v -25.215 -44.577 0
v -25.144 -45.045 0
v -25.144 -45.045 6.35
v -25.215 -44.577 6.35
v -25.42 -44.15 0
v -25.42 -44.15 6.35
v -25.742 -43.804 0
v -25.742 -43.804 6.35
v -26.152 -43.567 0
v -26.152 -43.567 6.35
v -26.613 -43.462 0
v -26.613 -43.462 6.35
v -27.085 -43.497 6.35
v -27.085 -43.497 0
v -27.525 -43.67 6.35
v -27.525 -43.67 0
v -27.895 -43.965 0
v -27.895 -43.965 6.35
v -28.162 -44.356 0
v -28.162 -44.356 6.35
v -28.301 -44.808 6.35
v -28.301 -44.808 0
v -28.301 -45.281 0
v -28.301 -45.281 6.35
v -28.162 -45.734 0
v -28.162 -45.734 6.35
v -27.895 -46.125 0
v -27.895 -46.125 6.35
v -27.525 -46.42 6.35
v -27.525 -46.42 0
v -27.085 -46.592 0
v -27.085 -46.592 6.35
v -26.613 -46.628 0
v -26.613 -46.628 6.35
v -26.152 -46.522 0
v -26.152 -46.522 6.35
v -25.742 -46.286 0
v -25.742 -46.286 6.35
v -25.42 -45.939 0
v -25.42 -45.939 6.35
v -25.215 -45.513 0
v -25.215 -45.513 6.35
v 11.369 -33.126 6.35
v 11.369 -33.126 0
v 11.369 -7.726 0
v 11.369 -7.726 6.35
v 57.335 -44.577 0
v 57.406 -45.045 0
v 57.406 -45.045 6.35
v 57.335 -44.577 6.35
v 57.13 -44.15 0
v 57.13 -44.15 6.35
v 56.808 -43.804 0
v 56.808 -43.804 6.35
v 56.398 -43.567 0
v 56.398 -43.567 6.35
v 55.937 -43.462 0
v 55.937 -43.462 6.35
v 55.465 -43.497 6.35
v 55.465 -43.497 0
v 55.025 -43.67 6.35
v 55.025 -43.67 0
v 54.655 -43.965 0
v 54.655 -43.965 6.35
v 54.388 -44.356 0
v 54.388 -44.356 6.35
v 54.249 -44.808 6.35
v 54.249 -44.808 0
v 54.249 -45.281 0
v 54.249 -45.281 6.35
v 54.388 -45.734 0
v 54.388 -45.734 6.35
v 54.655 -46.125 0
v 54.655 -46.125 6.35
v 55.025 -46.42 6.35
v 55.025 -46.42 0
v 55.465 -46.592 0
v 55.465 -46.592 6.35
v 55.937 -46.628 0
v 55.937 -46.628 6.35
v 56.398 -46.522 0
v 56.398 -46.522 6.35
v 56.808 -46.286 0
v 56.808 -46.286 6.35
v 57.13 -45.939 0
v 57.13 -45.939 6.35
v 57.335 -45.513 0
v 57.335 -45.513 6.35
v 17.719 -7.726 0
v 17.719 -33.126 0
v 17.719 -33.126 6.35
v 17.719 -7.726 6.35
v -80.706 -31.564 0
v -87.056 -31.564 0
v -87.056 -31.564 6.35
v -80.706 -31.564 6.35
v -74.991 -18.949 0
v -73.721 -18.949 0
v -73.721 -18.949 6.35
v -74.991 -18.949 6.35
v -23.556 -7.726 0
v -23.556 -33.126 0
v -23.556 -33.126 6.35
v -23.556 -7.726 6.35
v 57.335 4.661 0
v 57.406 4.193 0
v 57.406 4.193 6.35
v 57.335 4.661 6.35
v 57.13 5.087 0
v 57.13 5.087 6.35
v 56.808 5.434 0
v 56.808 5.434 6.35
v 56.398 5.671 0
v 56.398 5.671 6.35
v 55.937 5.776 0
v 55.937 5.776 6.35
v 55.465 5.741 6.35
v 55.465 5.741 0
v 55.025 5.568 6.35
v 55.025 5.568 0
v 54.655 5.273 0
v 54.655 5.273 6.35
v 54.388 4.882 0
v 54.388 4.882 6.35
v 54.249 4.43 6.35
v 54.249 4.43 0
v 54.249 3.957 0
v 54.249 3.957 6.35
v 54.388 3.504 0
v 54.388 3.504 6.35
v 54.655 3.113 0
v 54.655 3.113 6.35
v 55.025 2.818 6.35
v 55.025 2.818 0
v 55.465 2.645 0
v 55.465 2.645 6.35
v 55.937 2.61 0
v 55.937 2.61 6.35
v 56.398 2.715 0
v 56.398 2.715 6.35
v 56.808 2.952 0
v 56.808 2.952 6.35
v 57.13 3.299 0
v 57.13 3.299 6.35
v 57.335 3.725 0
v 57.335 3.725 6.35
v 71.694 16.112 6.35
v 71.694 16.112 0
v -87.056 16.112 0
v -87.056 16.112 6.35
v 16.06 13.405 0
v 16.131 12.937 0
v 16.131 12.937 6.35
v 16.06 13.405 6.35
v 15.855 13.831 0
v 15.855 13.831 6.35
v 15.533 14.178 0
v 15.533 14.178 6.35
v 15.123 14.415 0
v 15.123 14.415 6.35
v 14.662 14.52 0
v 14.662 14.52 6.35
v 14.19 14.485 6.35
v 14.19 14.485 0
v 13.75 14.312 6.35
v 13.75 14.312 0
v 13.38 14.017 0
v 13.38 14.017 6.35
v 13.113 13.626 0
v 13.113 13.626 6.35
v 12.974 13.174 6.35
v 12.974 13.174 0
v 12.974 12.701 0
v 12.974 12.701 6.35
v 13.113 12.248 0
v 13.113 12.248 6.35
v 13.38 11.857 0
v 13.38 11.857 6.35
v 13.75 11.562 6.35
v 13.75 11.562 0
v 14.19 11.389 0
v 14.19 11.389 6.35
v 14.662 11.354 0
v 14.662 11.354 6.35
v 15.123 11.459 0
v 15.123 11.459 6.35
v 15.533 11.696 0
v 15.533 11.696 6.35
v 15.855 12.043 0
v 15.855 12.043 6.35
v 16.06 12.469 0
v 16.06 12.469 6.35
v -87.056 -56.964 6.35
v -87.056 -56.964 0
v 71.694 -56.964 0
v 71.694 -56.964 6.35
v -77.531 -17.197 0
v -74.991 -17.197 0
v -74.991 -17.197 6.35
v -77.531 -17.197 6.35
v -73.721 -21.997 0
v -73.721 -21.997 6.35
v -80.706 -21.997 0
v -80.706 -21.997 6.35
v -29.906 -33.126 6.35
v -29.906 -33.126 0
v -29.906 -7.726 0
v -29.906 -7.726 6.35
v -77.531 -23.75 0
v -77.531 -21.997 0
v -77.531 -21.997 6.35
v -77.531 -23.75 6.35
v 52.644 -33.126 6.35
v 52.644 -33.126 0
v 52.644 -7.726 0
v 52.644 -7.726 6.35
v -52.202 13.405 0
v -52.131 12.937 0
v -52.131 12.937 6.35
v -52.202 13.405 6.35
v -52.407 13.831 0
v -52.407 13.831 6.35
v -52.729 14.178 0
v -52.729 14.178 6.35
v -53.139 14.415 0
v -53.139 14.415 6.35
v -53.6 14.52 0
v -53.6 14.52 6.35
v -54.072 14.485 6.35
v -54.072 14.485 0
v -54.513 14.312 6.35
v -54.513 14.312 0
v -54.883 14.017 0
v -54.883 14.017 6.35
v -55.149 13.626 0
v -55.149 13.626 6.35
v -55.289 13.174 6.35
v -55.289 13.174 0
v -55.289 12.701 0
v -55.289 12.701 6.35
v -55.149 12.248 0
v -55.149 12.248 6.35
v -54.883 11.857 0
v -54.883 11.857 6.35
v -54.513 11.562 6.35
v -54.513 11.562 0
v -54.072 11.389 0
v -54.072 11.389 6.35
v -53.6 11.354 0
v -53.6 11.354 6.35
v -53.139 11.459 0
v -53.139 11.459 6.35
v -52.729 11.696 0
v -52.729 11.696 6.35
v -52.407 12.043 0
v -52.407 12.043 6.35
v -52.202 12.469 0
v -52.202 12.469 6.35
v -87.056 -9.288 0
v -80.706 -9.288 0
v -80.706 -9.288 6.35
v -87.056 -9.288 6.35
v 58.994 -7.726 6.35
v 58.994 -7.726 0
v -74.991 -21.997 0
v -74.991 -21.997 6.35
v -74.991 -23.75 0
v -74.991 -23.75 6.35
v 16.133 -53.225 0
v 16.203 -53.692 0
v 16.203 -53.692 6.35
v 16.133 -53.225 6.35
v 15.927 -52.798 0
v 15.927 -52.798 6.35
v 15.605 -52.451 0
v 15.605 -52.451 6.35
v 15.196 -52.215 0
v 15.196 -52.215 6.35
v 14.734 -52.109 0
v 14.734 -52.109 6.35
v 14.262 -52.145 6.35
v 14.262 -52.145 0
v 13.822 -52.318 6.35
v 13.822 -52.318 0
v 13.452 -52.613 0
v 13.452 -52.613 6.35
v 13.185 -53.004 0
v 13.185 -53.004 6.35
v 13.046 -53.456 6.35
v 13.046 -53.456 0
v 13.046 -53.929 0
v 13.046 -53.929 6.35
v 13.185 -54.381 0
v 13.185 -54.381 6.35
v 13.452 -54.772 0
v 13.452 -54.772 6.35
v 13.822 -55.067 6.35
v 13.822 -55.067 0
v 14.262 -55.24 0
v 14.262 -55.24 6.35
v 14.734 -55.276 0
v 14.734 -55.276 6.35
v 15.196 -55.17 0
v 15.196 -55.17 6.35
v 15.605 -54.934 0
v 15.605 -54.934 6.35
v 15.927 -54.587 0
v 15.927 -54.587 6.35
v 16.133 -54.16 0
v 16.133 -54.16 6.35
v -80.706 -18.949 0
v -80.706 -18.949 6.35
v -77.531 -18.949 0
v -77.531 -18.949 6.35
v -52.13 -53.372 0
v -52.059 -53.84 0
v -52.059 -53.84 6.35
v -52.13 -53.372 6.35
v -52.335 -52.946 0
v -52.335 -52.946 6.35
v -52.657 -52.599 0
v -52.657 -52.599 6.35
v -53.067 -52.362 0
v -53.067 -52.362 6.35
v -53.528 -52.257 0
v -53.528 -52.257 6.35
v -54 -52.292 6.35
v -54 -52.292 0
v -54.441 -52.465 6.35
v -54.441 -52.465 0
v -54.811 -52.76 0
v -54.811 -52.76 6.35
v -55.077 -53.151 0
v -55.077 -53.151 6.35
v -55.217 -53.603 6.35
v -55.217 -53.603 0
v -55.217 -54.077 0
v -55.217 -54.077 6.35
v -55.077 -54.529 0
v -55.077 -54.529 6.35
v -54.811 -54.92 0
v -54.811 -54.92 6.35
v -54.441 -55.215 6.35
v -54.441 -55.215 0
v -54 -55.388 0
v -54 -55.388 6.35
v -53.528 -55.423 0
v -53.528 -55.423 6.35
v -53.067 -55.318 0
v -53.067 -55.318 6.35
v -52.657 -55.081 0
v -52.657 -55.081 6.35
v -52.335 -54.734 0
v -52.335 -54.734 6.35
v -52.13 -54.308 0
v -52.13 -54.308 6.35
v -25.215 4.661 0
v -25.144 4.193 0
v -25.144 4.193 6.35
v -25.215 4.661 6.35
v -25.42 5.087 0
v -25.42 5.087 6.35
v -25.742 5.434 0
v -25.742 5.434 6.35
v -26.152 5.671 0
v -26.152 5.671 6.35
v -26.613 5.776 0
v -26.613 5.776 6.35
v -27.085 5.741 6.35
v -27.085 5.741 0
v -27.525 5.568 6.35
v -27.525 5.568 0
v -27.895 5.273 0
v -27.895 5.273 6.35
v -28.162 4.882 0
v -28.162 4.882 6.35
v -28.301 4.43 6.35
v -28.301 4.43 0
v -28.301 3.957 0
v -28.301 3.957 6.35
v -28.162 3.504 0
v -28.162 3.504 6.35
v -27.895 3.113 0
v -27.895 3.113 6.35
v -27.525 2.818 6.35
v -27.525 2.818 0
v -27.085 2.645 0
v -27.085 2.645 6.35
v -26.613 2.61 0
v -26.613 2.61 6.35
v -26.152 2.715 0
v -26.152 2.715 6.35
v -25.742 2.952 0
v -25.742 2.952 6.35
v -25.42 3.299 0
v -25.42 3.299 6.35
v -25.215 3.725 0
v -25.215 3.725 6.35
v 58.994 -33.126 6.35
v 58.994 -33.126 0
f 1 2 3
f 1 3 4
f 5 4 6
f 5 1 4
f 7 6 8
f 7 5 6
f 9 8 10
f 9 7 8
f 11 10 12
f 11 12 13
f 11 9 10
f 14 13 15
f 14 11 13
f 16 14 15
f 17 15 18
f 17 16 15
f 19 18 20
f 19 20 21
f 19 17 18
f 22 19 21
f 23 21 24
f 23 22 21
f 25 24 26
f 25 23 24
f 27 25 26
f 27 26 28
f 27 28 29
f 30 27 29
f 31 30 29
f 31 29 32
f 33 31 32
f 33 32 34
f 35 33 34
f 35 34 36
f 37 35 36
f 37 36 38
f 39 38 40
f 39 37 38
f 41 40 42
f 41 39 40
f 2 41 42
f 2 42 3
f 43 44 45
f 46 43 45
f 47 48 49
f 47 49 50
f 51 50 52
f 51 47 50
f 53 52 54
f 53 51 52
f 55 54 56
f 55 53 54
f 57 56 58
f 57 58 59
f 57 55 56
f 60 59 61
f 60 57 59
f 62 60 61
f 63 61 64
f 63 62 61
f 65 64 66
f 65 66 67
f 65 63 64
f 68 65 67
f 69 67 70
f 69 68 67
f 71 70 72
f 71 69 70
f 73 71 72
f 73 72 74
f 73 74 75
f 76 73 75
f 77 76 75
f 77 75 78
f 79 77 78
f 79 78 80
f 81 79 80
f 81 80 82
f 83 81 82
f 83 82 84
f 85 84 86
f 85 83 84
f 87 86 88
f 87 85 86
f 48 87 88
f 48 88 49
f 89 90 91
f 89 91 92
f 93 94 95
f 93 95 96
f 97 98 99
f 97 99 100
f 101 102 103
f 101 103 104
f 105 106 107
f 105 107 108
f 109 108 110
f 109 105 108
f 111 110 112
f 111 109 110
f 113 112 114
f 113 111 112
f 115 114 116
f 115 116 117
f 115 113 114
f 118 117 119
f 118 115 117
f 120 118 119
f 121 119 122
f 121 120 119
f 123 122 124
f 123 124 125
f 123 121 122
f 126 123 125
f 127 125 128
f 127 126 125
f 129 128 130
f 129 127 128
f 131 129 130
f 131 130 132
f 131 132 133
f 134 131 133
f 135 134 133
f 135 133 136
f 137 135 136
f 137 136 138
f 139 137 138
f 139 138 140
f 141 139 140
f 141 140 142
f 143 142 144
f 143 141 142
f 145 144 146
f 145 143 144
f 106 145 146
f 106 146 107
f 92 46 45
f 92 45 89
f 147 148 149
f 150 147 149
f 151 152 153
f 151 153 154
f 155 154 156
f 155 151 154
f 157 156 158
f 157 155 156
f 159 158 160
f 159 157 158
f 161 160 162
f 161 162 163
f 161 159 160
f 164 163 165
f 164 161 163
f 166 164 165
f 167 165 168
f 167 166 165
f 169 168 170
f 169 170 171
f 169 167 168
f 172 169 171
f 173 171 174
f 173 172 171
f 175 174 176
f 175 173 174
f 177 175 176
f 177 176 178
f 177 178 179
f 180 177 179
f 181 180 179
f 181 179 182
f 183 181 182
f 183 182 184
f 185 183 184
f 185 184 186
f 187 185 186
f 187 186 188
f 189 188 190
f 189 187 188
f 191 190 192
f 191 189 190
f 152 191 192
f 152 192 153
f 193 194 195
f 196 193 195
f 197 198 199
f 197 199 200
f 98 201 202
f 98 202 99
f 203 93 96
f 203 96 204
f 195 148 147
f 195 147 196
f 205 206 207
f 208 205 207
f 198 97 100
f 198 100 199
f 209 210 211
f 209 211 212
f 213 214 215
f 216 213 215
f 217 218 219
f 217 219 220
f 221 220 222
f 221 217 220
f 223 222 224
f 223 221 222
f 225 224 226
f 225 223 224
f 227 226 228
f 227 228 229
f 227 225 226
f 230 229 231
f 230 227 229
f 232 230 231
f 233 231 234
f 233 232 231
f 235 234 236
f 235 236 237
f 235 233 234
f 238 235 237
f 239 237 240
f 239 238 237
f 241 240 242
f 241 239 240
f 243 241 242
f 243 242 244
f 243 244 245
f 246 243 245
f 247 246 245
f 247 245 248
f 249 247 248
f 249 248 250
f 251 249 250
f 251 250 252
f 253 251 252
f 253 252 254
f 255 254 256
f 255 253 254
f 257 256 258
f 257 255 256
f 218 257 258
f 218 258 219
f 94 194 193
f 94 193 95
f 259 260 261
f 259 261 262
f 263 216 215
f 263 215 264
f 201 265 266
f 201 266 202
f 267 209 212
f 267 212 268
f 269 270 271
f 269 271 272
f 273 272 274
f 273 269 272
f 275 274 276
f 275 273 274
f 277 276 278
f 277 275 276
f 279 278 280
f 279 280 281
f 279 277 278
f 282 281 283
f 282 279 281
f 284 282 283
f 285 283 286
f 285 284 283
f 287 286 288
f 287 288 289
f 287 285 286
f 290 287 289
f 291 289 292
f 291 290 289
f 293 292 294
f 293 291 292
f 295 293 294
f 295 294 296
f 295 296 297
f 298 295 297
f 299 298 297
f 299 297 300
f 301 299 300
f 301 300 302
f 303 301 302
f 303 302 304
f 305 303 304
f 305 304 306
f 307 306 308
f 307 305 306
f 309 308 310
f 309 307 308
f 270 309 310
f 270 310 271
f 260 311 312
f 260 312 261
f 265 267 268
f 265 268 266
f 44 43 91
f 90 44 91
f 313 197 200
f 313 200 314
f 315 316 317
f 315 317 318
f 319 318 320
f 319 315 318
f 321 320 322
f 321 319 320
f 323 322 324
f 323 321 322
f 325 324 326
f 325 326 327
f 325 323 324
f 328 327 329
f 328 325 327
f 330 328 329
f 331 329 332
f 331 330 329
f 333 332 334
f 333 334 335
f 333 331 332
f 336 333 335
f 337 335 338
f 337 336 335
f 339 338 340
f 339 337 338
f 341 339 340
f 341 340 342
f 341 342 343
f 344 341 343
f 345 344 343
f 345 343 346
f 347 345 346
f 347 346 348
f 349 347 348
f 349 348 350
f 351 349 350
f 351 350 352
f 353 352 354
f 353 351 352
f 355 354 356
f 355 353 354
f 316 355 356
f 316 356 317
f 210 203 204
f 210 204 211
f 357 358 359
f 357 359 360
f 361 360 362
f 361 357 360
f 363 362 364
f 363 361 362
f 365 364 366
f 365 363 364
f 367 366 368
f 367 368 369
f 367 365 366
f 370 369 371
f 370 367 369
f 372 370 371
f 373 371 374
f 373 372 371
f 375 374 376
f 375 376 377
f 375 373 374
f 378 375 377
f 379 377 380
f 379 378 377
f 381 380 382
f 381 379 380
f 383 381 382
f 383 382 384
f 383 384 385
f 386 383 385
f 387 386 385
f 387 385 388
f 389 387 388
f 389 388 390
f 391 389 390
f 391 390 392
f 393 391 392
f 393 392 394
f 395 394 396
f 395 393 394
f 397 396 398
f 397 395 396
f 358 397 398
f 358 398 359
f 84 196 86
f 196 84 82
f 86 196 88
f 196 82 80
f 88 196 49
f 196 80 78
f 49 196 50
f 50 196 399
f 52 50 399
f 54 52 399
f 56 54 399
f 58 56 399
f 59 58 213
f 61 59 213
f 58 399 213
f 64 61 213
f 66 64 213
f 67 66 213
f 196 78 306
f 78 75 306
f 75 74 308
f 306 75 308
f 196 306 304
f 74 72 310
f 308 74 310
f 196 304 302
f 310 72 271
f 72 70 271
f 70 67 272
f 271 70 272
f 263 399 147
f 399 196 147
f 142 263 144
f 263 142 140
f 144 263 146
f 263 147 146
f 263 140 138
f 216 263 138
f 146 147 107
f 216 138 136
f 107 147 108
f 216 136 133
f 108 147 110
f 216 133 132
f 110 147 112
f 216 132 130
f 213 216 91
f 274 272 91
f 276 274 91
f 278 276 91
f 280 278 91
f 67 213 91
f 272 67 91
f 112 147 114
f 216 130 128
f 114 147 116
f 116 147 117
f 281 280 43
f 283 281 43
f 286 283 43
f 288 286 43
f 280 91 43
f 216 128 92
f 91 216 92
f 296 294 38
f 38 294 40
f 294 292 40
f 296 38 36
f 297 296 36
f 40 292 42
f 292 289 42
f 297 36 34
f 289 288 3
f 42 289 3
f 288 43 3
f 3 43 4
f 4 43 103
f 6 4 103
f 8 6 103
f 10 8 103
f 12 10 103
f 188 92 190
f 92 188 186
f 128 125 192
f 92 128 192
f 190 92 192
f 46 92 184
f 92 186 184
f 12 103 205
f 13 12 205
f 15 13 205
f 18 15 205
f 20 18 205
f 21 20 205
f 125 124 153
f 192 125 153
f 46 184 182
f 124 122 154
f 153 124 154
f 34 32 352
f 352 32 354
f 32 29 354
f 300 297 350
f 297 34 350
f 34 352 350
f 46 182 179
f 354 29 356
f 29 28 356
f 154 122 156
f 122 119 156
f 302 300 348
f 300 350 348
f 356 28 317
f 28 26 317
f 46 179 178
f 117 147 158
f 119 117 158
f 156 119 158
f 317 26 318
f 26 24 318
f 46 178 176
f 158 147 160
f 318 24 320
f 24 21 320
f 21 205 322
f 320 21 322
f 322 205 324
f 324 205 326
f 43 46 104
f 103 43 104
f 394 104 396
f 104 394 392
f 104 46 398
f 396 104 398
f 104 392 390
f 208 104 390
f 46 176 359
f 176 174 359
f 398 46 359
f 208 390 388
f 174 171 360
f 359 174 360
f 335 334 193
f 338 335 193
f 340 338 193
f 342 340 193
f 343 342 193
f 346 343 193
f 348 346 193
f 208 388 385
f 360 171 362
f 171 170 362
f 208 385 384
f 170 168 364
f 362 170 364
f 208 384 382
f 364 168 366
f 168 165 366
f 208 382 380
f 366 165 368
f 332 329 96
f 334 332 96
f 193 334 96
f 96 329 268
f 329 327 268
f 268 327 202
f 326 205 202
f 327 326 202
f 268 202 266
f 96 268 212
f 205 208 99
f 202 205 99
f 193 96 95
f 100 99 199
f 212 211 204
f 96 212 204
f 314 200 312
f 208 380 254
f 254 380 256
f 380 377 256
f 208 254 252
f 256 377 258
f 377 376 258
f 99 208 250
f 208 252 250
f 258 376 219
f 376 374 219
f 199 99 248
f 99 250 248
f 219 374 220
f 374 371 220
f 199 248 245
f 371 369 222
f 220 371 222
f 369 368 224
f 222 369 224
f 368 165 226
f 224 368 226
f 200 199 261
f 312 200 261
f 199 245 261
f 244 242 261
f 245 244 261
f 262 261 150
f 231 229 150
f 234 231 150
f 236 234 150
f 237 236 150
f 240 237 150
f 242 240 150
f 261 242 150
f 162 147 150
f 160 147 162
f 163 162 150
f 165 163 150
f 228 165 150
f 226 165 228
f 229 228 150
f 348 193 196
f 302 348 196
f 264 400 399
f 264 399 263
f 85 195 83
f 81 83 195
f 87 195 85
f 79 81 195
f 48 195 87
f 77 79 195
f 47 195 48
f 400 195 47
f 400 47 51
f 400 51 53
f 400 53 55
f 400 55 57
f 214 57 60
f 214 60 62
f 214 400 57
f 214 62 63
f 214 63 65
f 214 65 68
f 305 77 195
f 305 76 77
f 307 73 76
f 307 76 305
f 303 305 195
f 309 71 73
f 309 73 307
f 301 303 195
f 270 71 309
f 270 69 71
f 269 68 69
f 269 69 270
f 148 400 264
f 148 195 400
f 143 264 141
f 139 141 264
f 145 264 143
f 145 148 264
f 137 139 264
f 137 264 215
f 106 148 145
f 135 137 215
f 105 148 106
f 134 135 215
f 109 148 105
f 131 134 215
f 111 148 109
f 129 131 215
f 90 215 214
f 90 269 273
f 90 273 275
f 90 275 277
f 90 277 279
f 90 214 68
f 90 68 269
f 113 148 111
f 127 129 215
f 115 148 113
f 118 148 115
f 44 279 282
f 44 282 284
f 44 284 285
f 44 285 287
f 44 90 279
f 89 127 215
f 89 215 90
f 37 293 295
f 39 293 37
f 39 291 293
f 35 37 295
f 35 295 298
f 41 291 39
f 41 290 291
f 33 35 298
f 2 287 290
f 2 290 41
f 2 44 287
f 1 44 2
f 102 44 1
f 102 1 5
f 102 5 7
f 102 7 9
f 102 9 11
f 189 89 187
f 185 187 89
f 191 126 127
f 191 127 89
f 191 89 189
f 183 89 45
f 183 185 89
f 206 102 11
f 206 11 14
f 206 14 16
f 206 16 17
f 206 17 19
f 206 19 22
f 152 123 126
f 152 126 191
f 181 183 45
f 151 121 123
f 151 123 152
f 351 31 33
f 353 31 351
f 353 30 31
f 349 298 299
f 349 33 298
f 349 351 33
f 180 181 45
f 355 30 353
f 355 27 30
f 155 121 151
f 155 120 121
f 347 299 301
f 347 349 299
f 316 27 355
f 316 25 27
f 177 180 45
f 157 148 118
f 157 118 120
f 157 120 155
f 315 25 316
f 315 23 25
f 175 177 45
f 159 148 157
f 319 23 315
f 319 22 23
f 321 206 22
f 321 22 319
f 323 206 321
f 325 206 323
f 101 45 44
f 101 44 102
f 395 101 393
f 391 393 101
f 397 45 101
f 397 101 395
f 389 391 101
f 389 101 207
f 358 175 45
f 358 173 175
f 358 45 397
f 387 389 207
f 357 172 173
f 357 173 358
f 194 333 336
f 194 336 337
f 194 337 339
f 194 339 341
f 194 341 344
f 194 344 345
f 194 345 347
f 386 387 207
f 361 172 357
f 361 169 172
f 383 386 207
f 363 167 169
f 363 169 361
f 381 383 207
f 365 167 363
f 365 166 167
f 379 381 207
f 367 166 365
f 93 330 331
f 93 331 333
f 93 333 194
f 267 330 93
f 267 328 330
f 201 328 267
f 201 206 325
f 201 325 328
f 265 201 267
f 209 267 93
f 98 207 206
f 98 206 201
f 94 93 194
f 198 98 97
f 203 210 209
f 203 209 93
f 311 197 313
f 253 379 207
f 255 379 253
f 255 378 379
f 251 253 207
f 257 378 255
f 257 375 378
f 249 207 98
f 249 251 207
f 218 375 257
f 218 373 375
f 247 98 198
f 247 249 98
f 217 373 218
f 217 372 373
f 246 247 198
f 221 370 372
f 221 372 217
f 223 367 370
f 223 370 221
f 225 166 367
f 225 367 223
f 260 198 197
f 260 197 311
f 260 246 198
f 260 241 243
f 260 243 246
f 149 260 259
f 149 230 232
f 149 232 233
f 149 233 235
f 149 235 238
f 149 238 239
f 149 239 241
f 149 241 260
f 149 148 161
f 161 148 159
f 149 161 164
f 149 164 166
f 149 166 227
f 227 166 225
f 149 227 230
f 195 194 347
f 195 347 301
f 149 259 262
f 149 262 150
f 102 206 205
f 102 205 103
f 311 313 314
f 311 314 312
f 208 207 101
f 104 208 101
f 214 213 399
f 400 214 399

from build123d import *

# Parameters (mm, degrees)
SKETCH1_R           = 1.5875
SKETCH1_W           = 6.35
SKETCH1_H           = 25.4
BOSS_EXTRUDE1_DEPTH = 6.35


with BuildPart() as part:
    # Sketch1 → Boss-Extrude1 (new body)
    with BuildSketch(Plane.XY):
        Polygon((-80.70648923, -31.56367818), (-80.70648923, -21.997051347), (-77.53148923, -21.997051347), (-77.53148923, -23.749651347), (-74.99148923, -23.749651347), (-74.99148923, -21.997051347), (-73.72148923, -21.997051347), (-73.72148923, -18.949191991), (-74.99148923, -18.949191991), (-74.99148923, -17.196591991), (-77.53148923, -17.196591991), (-77.53148923, -18.949191991), (-80.70648923, -18.949191991), (-80.70648923, -9.28787818), (-87.05648923, -9.28787818), (-87.05648923, 16.11212182), (-80.70648923, 16.11212182), (71.69351077, 16.11212182), (71.69351077, -56.96367818), (-80.70648923, -56.96367818), (-87.05648923, -56.96367818), (-87.05648923, -31.56367818), align=None)
        with Locations((-26.73148923, 4.19317182)):
            Circle(SKETCH1_R, mode=Mode.SUBTRACT)
        with Locations((-26.73148923, -45.04472818)):
            Circle(SKETCH1_R, mode=Mode.SUBTRACT)
        with Locations((55.81851077, 4.19317182)):
            Circle(SKETCH1_R, mode=Mode.SUBTRACT)
        with Locations((55.81851077, -45.04472818)):
            Circle(SKETCH1_R, mode=Mode.SUBTRACT)
        with Locations((-53.71898923, 12.93712182)):
            Circle(SKETCH1_R, mode=Mode.SUBTRACT)
        with Locations((14.54351077, 12.93712182)):
            Circle(SKETCH1_R, mode=Mode.SUBTRACT)
        with Locations((-53.64679782, -53.840086503)):
            Circle(SKETCH1_R, mode=Mode.SUBTRACT)
        with Locations((14.615542619, -53.692492422)):
            Circle(SKETCH1_R, mode=Mode.SUBTRACT)
        with Locations((-26.73148923, -20.42577818)):
            Rectangle(SKETCH1_W, SKETCH1_H, mode=Mode.SUBTRACT)
        with Locations((55.81851077, -20.42577818)):
            Rectangle(SKETCH1_W, SKETCH1_H, mode=Mode.SUBTRACT)
        with Locations((14.54351077, -20.42577818)):
            Rectangle(SKETCH1_W, SKETCH1_H, mode=Mode.SUBTRACT)
    extrude(amount=BOSS_EXTRUDE1_DEPTH)


solid = part.part
